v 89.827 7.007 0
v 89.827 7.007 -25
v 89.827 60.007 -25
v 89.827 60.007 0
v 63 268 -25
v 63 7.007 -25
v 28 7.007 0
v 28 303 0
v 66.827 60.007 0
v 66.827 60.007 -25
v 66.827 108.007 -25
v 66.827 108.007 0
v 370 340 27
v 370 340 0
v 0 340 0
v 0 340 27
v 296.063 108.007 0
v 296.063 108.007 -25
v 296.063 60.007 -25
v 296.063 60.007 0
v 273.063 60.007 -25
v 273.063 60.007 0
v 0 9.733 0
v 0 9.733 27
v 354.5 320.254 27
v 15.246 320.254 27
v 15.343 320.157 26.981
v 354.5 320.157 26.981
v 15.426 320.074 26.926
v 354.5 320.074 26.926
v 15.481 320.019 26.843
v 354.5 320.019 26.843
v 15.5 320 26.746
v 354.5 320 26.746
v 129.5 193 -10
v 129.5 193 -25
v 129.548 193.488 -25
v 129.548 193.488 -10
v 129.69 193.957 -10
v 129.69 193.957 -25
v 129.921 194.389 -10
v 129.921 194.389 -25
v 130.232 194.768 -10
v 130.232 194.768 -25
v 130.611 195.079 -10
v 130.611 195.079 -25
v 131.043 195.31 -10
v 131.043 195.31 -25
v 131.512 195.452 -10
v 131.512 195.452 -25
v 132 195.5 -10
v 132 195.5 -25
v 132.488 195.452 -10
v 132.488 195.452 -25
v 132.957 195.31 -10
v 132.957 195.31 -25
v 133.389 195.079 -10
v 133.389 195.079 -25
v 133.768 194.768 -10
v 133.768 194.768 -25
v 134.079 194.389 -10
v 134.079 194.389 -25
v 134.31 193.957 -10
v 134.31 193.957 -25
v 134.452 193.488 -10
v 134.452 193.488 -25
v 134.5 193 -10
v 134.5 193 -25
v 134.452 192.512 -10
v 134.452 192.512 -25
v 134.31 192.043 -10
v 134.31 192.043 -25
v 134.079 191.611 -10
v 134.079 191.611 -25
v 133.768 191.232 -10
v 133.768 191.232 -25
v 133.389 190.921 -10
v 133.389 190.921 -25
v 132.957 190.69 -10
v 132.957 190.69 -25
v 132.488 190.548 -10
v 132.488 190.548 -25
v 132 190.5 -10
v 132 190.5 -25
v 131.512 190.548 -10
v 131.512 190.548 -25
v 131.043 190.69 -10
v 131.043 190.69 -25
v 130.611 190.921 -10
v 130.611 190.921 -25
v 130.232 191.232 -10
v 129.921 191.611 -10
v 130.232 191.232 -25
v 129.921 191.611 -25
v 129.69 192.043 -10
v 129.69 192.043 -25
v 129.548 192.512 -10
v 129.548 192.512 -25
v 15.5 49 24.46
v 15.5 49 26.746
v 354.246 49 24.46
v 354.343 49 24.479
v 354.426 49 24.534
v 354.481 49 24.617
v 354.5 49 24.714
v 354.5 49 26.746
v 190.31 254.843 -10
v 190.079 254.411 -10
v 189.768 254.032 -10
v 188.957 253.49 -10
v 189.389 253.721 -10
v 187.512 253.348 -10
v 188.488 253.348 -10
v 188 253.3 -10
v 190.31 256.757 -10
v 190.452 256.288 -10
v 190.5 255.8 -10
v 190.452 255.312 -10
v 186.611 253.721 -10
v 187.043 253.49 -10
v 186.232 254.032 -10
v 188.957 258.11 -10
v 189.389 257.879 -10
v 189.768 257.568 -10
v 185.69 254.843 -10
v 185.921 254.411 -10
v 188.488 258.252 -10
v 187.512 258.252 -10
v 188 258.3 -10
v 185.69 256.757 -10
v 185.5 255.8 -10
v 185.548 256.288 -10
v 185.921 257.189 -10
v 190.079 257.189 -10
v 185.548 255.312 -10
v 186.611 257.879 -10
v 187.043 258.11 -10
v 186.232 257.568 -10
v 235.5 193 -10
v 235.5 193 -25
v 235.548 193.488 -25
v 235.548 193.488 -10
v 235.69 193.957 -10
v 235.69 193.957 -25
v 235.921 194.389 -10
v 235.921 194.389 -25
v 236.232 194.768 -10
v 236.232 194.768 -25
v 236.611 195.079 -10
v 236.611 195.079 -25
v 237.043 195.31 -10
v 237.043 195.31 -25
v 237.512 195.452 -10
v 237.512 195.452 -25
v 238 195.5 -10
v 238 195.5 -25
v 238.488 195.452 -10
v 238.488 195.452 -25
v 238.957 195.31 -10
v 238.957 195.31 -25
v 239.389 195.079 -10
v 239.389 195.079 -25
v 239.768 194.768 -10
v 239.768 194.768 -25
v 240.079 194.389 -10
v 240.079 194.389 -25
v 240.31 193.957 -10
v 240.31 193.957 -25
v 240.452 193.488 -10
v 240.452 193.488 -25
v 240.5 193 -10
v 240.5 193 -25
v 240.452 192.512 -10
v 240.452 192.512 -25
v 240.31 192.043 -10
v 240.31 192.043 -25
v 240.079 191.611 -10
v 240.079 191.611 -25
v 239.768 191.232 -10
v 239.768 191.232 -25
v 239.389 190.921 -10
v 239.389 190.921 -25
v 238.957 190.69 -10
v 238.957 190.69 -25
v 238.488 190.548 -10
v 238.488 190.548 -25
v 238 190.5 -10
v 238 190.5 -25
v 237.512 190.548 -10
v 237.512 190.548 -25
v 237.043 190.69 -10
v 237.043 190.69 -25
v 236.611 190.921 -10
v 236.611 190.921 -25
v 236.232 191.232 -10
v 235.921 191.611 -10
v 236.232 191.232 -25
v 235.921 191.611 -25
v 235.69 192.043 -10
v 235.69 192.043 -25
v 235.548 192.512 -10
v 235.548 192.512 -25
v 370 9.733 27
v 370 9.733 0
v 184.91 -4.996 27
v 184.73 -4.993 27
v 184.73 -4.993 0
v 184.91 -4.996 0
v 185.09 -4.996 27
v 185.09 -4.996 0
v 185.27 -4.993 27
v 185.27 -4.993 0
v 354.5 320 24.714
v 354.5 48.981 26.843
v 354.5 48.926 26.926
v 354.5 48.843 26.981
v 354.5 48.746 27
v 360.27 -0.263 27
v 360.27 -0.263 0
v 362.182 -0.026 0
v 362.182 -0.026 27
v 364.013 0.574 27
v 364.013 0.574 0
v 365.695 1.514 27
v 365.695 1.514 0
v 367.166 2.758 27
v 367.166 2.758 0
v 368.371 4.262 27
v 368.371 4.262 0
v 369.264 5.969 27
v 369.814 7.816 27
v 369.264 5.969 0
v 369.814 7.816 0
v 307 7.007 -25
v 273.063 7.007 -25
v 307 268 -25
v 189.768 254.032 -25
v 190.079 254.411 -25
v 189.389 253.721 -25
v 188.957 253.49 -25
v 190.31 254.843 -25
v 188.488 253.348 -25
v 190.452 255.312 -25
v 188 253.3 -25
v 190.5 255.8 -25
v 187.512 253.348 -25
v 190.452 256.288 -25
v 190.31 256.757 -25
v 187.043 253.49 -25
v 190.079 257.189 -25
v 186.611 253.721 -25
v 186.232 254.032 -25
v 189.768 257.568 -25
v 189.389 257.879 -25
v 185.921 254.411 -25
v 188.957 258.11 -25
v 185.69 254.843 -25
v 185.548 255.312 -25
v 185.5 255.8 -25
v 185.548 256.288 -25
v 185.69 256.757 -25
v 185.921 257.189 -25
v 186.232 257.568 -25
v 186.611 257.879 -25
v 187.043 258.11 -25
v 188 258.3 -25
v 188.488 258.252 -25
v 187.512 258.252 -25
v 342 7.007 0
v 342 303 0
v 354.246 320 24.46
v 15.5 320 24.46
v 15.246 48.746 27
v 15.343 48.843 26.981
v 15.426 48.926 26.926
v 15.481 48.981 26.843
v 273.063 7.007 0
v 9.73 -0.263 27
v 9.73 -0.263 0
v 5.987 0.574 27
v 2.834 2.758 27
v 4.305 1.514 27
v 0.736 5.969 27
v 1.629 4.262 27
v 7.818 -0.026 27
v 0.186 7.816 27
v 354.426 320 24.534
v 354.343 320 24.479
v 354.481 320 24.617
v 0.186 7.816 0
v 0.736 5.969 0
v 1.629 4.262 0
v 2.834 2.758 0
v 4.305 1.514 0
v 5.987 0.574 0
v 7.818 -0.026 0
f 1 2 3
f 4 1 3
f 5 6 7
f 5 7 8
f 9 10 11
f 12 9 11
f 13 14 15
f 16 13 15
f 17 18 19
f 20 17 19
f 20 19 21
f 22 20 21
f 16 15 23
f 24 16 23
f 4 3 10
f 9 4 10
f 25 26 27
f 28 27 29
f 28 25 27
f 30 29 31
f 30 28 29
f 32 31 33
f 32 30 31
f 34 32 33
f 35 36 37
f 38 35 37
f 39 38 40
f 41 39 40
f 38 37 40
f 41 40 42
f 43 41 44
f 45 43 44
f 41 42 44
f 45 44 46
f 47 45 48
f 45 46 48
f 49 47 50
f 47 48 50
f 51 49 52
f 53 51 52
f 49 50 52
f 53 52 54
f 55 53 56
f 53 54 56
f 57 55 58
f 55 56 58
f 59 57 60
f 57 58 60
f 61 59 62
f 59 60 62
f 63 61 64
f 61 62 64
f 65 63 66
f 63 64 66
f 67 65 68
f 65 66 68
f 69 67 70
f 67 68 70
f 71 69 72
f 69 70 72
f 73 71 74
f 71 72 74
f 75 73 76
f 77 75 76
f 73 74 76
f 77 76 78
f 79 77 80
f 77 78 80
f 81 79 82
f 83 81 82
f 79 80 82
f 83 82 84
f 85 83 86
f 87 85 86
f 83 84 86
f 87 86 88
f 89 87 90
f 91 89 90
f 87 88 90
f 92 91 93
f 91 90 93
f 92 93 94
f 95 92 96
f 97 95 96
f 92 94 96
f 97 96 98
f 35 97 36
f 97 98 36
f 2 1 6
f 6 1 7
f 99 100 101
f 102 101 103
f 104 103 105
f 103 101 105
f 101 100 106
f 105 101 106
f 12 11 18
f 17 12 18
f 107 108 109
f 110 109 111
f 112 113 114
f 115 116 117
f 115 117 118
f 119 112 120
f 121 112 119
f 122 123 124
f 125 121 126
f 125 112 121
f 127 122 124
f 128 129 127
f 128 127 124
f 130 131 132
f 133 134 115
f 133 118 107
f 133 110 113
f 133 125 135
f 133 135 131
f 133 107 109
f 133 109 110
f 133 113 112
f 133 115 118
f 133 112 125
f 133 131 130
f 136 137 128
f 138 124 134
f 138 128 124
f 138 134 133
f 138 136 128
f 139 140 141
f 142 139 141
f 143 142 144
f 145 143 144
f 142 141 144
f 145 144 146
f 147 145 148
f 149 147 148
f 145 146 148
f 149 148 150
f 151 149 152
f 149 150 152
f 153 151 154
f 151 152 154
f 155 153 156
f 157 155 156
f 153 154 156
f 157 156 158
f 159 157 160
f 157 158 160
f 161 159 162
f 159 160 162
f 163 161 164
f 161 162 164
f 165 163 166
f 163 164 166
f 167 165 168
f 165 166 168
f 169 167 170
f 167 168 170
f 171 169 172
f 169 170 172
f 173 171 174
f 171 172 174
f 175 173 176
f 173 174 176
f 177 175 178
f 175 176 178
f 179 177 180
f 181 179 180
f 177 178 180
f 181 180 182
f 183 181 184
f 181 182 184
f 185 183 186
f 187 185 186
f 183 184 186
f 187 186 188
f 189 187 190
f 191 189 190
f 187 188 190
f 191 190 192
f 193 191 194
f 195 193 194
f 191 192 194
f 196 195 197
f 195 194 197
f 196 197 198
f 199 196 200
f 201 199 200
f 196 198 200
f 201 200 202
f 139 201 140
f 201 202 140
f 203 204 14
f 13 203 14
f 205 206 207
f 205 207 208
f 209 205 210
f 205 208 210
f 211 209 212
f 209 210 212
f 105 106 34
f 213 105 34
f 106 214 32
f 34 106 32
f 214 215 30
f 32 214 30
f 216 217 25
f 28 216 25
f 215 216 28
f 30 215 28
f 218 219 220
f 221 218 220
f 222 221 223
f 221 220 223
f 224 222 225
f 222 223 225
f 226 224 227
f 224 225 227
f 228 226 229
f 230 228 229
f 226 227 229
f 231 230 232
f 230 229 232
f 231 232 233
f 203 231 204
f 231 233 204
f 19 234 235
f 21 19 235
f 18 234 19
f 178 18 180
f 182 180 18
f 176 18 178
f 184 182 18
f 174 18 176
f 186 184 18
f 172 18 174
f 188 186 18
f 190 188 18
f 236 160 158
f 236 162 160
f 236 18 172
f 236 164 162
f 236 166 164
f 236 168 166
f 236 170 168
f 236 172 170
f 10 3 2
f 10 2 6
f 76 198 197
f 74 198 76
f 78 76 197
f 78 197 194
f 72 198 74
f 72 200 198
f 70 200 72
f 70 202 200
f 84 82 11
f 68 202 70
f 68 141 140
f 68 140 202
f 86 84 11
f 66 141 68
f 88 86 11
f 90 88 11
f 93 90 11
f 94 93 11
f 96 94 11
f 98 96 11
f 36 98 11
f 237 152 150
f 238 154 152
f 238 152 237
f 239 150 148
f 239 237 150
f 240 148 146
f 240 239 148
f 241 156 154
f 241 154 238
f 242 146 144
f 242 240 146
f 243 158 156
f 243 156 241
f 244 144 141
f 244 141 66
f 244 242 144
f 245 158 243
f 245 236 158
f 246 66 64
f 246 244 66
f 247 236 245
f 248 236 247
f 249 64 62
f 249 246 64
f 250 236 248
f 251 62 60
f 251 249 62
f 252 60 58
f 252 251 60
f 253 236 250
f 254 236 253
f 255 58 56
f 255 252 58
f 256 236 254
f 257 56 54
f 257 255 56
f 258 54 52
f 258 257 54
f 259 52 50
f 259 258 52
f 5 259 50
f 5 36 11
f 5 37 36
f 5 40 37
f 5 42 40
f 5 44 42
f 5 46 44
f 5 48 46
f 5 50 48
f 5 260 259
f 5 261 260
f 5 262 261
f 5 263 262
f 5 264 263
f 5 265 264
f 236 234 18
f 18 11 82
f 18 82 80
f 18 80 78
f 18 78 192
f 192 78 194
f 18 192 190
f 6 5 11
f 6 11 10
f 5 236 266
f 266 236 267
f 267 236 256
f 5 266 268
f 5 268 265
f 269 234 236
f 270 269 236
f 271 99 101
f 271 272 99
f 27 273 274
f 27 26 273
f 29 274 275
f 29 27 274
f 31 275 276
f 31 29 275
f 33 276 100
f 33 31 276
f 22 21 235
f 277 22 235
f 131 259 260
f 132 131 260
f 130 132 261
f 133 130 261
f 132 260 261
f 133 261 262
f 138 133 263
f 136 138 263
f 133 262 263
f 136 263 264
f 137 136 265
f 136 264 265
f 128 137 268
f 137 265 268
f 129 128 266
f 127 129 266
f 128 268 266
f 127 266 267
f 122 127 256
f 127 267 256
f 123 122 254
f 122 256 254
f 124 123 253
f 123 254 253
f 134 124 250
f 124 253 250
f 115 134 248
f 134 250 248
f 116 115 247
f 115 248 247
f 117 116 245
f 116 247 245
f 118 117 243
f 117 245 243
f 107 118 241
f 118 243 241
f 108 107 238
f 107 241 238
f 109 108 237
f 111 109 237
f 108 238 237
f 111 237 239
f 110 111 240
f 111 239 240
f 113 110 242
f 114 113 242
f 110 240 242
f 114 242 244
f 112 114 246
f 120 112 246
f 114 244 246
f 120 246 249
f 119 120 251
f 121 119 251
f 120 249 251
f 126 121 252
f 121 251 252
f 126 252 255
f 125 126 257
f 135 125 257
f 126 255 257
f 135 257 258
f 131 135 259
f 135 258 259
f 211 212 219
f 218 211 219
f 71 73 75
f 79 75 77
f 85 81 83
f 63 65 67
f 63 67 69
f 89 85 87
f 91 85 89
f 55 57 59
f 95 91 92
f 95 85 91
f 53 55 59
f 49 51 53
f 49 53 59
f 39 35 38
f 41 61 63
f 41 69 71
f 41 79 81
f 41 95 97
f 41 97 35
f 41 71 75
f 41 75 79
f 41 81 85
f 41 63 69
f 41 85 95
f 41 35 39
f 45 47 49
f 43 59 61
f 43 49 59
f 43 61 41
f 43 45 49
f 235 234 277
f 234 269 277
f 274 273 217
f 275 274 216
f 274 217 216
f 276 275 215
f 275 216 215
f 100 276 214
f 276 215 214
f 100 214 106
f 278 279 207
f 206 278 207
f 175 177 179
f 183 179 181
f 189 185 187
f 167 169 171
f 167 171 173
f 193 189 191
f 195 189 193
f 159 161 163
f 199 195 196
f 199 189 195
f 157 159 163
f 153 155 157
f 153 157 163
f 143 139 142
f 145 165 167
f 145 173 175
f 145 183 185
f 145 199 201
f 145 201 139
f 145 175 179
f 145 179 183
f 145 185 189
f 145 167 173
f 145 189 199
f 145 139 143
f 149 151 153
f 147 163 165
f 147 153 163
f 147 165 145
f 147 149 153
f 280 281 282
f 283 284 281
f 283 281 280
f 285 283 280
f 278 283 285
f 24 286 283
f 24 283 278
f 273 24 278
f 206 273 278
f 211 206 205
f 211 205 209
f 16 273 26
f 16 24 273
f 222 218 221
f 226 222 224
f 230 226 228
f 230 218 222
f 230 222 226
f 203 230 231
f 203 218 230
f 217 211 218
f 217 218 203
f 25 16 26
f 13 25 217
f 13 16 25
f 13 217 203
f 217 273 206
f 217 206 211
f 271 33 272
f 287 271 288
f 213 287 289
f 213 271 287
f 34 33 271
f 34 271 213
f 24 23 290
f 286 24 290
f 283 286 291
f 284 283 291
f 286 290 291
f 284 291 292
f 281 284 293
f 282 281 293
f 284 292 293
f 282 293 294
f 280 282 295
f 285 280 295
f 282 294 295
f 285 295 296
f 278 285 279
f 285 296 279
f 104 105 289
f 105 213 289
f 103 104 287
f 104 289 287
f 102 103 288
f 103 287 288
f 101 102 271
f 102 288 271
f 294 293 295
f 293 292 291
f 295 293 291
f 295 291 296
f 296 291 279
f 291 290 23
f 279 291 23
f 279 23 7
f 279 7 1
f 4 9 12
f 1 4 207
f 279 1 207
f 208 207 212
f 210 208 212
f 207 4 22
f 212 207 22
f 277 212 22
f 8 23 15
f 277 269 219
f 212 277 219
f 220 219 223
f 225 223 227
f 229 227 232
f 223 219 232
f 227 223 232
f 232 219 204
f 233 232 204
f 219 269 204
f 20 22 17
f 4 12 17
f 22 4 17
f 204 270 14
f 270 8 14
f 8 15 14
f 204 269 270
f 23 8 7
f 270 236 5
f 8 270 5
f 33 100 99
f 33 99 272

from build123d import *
from OCP.BRepFilletAPI import BRepFilletAPI_MakeChamfer

# Parameters (mm, degrees)
BOSS_EXTRUDE1_DEPTH     = 27
SKETCH2_W               = 339
SKETCH2_H               = 271
CUT_EXTRUDE1_DEPTH      = 2.54
FILLET2_R               = 0.254
ESQUISSE1_W             = 314
ESQUISSE1_H             = 295.992698065
BOSS_EXTRU_1_DEPTH      = 25
CHANFREIN1_SIZE         = 25
CHANFREIN1_SIZE_2       = 35
ENL_V_MAT_EXTRU_1_DEPTH = 25
ESQUISSE3_R             = 2.5
ENL_V_MAT_EXTRU_2_DEPTH = 15


with BuildPart() as part:
    # Sketch1 → Boss-Extrude1 (new body)
    with BuildSketch(Plane.XY):
        with BuildLine():
            Line((9.729828387, -0.262968335), (184.729828387, -4.992698065))
            ThreePointArc((184.729828387, -4.992698065), (185, -4.996348366), (185.270171613, -4.992698065))
            Line((185.270171613, -4.992698065), (360.270171613, -0.262968335))
            ThreePointArc((360.270171613, -0.262968335), (367.165951302, 2.758487678), (370, 9.733381364))
            Line((370, 9.733381364), (370, 340))
            Line((370, 340), (0, 340))
            Line((0, 340), (0, 9.733381364))
            ThreePointArc((0, 9.733381364), (2.834048698, 2.758487678), (9.729828387, -0.262968335))
        make_face()
    extrude(amount=BOSS_EXTRUDE1_DEPTH)

    # Sketch2 → Cut-Extrude1 (cut)
    with BuildSketch(Plane.XY.offset(27)):
        with Locations((185, 184.5)):
            Rectangle(SKETCH2_W, SKETCH2_H)
    extrude(amount=-CUT_EXTRUDE1_DEPTH, mode=Mode.SUBTRACT)

    # Fillet2
    fillet2_edges = [part.edges().sort_by_distance(p)[0] for p in [
        (354.5, 184.5, 24.46),
        (15.5, 184.5, 27),
        (185, 49, 27),
        (185, 320, 27),
    ]]
    fillet(fillet2_edges, radius=FILLET2_R)

    # Esquisse1 → Boss.-Extru.1 (add)
    with BuildSketch(Plane(origin=(0, 0, 0), x_dir=(-1, 0, 0), z_dir=(0, 0, -1))):
        with Locations((-185, 155.003650967)):
            Rectangle(ESQUISSE1_W, ESQUISSE1_H)
    extrude(amount=BOSS_EXTRU_1_DEPTH)

    # Chanfrein1
    chanfrein1_edges_1 = [part.edges().sort_by_distance(p)[0] for p in [
        (28, 155.003650968, -25),
    ]]
    chanfrein1_side_1 = [part.faces().sort_by_distance(p)[0] for p in [
        (28, 155.003650968, -24.5),
    ]]
    chanfrein1_edges_2 = [part.edges().sort_by_distance(p)[0] for p in [
        (185, 303, -25),
    ]]
    chanfrein1_side_2 = [part.faces().sort_by_distance(p)[0] for p in [
        (185, 303, -24.5),
    ]]
    chanfrein1_edges_3 = [part.edges().sort_by_distance(p)[0] for p in [
        (342, 155.003650968, -25),
    ]]
    chanfrein1_side_3 = [part.faces().sort_by_distance(p)[0] for p in [
        (342, 155.003650968, -24.5),
    ]]
    chanfrein1 = BRepFilletAPI_MakeChamfer(part.part.solid().wrapped)
    for e in chanfrein1_edges_1:
        chanfrein1.Add(CHANFREIN1_SIZE - 0.0001, CHANFREIN1_SIZE_2 - 0.0001, e.wrapped, chanfrein1_side_1[0].wrapped)
    for e in chanfrein1_edges_2:
        chanfrein1.Add(CHANFREIN1_SIZE - 0.0001, CHANFREIN1_SIZE_2 - 0.0001, e.wrapped, chanfrein1_side_2[0].wrapped)
    for e in chanfrein1_edges_3:
        chanfrein1.Add(CHANFREIN1_SIZE - 0.0001, CHANFREIN1_SIZE_2 - 0.0001, e.wrapped, chanfrein1_side_3[0].wrapped)
    add(Compound.cast(chanfrein1.Shape()), mode=Mode.REPLACE)  # a hair under: the kernel refuses the full size

    # Esquisse2 → Enlèv. mat.-Extru.1 (cut)
    with BuildSketch(Plane(origin=(0, 0, -25), x_dir=(-1, 0, 0), z_dir=(0, 0, -1))):
        Polygon((-273.063305356, 7.007301935), (-89.826670404, 7.007301935), (-89.826670404, 60.007301935), (-66.826670404, 60.007301935), (-66.826670404, 108.007301935), (-296.063305356, 108.007301935), (-296.063305356, 60.007301935), (-273.063305356, 60.007301935), align=None)
    extrude(amount=-ENL_V_MAT_EXTRU_1_DEPTH, mode=Mode.SUBTRACT)

    # Esquisse3 → Enlèv. mat.-Extru.2 (cut)
    with BuildSketch(Plane(origin=(0, 0, -25), x_dir=(-1, 0, 0), z_dir=(0, 0, -1))):
        with Locations((-188, 255.8)):
            Circle(ESQUISSE3_R)
        with Locations((-238, 193)):
            Circle(ESQUISSE3_R)
        with Locations((-132, 193)):
            Circle(ESQUISSE3_R)
    extrude(amount=-ENL_V_MAT_EXTRU_2_DEPTH, mode=Mode.SUBTRACT)


solid = part.part
